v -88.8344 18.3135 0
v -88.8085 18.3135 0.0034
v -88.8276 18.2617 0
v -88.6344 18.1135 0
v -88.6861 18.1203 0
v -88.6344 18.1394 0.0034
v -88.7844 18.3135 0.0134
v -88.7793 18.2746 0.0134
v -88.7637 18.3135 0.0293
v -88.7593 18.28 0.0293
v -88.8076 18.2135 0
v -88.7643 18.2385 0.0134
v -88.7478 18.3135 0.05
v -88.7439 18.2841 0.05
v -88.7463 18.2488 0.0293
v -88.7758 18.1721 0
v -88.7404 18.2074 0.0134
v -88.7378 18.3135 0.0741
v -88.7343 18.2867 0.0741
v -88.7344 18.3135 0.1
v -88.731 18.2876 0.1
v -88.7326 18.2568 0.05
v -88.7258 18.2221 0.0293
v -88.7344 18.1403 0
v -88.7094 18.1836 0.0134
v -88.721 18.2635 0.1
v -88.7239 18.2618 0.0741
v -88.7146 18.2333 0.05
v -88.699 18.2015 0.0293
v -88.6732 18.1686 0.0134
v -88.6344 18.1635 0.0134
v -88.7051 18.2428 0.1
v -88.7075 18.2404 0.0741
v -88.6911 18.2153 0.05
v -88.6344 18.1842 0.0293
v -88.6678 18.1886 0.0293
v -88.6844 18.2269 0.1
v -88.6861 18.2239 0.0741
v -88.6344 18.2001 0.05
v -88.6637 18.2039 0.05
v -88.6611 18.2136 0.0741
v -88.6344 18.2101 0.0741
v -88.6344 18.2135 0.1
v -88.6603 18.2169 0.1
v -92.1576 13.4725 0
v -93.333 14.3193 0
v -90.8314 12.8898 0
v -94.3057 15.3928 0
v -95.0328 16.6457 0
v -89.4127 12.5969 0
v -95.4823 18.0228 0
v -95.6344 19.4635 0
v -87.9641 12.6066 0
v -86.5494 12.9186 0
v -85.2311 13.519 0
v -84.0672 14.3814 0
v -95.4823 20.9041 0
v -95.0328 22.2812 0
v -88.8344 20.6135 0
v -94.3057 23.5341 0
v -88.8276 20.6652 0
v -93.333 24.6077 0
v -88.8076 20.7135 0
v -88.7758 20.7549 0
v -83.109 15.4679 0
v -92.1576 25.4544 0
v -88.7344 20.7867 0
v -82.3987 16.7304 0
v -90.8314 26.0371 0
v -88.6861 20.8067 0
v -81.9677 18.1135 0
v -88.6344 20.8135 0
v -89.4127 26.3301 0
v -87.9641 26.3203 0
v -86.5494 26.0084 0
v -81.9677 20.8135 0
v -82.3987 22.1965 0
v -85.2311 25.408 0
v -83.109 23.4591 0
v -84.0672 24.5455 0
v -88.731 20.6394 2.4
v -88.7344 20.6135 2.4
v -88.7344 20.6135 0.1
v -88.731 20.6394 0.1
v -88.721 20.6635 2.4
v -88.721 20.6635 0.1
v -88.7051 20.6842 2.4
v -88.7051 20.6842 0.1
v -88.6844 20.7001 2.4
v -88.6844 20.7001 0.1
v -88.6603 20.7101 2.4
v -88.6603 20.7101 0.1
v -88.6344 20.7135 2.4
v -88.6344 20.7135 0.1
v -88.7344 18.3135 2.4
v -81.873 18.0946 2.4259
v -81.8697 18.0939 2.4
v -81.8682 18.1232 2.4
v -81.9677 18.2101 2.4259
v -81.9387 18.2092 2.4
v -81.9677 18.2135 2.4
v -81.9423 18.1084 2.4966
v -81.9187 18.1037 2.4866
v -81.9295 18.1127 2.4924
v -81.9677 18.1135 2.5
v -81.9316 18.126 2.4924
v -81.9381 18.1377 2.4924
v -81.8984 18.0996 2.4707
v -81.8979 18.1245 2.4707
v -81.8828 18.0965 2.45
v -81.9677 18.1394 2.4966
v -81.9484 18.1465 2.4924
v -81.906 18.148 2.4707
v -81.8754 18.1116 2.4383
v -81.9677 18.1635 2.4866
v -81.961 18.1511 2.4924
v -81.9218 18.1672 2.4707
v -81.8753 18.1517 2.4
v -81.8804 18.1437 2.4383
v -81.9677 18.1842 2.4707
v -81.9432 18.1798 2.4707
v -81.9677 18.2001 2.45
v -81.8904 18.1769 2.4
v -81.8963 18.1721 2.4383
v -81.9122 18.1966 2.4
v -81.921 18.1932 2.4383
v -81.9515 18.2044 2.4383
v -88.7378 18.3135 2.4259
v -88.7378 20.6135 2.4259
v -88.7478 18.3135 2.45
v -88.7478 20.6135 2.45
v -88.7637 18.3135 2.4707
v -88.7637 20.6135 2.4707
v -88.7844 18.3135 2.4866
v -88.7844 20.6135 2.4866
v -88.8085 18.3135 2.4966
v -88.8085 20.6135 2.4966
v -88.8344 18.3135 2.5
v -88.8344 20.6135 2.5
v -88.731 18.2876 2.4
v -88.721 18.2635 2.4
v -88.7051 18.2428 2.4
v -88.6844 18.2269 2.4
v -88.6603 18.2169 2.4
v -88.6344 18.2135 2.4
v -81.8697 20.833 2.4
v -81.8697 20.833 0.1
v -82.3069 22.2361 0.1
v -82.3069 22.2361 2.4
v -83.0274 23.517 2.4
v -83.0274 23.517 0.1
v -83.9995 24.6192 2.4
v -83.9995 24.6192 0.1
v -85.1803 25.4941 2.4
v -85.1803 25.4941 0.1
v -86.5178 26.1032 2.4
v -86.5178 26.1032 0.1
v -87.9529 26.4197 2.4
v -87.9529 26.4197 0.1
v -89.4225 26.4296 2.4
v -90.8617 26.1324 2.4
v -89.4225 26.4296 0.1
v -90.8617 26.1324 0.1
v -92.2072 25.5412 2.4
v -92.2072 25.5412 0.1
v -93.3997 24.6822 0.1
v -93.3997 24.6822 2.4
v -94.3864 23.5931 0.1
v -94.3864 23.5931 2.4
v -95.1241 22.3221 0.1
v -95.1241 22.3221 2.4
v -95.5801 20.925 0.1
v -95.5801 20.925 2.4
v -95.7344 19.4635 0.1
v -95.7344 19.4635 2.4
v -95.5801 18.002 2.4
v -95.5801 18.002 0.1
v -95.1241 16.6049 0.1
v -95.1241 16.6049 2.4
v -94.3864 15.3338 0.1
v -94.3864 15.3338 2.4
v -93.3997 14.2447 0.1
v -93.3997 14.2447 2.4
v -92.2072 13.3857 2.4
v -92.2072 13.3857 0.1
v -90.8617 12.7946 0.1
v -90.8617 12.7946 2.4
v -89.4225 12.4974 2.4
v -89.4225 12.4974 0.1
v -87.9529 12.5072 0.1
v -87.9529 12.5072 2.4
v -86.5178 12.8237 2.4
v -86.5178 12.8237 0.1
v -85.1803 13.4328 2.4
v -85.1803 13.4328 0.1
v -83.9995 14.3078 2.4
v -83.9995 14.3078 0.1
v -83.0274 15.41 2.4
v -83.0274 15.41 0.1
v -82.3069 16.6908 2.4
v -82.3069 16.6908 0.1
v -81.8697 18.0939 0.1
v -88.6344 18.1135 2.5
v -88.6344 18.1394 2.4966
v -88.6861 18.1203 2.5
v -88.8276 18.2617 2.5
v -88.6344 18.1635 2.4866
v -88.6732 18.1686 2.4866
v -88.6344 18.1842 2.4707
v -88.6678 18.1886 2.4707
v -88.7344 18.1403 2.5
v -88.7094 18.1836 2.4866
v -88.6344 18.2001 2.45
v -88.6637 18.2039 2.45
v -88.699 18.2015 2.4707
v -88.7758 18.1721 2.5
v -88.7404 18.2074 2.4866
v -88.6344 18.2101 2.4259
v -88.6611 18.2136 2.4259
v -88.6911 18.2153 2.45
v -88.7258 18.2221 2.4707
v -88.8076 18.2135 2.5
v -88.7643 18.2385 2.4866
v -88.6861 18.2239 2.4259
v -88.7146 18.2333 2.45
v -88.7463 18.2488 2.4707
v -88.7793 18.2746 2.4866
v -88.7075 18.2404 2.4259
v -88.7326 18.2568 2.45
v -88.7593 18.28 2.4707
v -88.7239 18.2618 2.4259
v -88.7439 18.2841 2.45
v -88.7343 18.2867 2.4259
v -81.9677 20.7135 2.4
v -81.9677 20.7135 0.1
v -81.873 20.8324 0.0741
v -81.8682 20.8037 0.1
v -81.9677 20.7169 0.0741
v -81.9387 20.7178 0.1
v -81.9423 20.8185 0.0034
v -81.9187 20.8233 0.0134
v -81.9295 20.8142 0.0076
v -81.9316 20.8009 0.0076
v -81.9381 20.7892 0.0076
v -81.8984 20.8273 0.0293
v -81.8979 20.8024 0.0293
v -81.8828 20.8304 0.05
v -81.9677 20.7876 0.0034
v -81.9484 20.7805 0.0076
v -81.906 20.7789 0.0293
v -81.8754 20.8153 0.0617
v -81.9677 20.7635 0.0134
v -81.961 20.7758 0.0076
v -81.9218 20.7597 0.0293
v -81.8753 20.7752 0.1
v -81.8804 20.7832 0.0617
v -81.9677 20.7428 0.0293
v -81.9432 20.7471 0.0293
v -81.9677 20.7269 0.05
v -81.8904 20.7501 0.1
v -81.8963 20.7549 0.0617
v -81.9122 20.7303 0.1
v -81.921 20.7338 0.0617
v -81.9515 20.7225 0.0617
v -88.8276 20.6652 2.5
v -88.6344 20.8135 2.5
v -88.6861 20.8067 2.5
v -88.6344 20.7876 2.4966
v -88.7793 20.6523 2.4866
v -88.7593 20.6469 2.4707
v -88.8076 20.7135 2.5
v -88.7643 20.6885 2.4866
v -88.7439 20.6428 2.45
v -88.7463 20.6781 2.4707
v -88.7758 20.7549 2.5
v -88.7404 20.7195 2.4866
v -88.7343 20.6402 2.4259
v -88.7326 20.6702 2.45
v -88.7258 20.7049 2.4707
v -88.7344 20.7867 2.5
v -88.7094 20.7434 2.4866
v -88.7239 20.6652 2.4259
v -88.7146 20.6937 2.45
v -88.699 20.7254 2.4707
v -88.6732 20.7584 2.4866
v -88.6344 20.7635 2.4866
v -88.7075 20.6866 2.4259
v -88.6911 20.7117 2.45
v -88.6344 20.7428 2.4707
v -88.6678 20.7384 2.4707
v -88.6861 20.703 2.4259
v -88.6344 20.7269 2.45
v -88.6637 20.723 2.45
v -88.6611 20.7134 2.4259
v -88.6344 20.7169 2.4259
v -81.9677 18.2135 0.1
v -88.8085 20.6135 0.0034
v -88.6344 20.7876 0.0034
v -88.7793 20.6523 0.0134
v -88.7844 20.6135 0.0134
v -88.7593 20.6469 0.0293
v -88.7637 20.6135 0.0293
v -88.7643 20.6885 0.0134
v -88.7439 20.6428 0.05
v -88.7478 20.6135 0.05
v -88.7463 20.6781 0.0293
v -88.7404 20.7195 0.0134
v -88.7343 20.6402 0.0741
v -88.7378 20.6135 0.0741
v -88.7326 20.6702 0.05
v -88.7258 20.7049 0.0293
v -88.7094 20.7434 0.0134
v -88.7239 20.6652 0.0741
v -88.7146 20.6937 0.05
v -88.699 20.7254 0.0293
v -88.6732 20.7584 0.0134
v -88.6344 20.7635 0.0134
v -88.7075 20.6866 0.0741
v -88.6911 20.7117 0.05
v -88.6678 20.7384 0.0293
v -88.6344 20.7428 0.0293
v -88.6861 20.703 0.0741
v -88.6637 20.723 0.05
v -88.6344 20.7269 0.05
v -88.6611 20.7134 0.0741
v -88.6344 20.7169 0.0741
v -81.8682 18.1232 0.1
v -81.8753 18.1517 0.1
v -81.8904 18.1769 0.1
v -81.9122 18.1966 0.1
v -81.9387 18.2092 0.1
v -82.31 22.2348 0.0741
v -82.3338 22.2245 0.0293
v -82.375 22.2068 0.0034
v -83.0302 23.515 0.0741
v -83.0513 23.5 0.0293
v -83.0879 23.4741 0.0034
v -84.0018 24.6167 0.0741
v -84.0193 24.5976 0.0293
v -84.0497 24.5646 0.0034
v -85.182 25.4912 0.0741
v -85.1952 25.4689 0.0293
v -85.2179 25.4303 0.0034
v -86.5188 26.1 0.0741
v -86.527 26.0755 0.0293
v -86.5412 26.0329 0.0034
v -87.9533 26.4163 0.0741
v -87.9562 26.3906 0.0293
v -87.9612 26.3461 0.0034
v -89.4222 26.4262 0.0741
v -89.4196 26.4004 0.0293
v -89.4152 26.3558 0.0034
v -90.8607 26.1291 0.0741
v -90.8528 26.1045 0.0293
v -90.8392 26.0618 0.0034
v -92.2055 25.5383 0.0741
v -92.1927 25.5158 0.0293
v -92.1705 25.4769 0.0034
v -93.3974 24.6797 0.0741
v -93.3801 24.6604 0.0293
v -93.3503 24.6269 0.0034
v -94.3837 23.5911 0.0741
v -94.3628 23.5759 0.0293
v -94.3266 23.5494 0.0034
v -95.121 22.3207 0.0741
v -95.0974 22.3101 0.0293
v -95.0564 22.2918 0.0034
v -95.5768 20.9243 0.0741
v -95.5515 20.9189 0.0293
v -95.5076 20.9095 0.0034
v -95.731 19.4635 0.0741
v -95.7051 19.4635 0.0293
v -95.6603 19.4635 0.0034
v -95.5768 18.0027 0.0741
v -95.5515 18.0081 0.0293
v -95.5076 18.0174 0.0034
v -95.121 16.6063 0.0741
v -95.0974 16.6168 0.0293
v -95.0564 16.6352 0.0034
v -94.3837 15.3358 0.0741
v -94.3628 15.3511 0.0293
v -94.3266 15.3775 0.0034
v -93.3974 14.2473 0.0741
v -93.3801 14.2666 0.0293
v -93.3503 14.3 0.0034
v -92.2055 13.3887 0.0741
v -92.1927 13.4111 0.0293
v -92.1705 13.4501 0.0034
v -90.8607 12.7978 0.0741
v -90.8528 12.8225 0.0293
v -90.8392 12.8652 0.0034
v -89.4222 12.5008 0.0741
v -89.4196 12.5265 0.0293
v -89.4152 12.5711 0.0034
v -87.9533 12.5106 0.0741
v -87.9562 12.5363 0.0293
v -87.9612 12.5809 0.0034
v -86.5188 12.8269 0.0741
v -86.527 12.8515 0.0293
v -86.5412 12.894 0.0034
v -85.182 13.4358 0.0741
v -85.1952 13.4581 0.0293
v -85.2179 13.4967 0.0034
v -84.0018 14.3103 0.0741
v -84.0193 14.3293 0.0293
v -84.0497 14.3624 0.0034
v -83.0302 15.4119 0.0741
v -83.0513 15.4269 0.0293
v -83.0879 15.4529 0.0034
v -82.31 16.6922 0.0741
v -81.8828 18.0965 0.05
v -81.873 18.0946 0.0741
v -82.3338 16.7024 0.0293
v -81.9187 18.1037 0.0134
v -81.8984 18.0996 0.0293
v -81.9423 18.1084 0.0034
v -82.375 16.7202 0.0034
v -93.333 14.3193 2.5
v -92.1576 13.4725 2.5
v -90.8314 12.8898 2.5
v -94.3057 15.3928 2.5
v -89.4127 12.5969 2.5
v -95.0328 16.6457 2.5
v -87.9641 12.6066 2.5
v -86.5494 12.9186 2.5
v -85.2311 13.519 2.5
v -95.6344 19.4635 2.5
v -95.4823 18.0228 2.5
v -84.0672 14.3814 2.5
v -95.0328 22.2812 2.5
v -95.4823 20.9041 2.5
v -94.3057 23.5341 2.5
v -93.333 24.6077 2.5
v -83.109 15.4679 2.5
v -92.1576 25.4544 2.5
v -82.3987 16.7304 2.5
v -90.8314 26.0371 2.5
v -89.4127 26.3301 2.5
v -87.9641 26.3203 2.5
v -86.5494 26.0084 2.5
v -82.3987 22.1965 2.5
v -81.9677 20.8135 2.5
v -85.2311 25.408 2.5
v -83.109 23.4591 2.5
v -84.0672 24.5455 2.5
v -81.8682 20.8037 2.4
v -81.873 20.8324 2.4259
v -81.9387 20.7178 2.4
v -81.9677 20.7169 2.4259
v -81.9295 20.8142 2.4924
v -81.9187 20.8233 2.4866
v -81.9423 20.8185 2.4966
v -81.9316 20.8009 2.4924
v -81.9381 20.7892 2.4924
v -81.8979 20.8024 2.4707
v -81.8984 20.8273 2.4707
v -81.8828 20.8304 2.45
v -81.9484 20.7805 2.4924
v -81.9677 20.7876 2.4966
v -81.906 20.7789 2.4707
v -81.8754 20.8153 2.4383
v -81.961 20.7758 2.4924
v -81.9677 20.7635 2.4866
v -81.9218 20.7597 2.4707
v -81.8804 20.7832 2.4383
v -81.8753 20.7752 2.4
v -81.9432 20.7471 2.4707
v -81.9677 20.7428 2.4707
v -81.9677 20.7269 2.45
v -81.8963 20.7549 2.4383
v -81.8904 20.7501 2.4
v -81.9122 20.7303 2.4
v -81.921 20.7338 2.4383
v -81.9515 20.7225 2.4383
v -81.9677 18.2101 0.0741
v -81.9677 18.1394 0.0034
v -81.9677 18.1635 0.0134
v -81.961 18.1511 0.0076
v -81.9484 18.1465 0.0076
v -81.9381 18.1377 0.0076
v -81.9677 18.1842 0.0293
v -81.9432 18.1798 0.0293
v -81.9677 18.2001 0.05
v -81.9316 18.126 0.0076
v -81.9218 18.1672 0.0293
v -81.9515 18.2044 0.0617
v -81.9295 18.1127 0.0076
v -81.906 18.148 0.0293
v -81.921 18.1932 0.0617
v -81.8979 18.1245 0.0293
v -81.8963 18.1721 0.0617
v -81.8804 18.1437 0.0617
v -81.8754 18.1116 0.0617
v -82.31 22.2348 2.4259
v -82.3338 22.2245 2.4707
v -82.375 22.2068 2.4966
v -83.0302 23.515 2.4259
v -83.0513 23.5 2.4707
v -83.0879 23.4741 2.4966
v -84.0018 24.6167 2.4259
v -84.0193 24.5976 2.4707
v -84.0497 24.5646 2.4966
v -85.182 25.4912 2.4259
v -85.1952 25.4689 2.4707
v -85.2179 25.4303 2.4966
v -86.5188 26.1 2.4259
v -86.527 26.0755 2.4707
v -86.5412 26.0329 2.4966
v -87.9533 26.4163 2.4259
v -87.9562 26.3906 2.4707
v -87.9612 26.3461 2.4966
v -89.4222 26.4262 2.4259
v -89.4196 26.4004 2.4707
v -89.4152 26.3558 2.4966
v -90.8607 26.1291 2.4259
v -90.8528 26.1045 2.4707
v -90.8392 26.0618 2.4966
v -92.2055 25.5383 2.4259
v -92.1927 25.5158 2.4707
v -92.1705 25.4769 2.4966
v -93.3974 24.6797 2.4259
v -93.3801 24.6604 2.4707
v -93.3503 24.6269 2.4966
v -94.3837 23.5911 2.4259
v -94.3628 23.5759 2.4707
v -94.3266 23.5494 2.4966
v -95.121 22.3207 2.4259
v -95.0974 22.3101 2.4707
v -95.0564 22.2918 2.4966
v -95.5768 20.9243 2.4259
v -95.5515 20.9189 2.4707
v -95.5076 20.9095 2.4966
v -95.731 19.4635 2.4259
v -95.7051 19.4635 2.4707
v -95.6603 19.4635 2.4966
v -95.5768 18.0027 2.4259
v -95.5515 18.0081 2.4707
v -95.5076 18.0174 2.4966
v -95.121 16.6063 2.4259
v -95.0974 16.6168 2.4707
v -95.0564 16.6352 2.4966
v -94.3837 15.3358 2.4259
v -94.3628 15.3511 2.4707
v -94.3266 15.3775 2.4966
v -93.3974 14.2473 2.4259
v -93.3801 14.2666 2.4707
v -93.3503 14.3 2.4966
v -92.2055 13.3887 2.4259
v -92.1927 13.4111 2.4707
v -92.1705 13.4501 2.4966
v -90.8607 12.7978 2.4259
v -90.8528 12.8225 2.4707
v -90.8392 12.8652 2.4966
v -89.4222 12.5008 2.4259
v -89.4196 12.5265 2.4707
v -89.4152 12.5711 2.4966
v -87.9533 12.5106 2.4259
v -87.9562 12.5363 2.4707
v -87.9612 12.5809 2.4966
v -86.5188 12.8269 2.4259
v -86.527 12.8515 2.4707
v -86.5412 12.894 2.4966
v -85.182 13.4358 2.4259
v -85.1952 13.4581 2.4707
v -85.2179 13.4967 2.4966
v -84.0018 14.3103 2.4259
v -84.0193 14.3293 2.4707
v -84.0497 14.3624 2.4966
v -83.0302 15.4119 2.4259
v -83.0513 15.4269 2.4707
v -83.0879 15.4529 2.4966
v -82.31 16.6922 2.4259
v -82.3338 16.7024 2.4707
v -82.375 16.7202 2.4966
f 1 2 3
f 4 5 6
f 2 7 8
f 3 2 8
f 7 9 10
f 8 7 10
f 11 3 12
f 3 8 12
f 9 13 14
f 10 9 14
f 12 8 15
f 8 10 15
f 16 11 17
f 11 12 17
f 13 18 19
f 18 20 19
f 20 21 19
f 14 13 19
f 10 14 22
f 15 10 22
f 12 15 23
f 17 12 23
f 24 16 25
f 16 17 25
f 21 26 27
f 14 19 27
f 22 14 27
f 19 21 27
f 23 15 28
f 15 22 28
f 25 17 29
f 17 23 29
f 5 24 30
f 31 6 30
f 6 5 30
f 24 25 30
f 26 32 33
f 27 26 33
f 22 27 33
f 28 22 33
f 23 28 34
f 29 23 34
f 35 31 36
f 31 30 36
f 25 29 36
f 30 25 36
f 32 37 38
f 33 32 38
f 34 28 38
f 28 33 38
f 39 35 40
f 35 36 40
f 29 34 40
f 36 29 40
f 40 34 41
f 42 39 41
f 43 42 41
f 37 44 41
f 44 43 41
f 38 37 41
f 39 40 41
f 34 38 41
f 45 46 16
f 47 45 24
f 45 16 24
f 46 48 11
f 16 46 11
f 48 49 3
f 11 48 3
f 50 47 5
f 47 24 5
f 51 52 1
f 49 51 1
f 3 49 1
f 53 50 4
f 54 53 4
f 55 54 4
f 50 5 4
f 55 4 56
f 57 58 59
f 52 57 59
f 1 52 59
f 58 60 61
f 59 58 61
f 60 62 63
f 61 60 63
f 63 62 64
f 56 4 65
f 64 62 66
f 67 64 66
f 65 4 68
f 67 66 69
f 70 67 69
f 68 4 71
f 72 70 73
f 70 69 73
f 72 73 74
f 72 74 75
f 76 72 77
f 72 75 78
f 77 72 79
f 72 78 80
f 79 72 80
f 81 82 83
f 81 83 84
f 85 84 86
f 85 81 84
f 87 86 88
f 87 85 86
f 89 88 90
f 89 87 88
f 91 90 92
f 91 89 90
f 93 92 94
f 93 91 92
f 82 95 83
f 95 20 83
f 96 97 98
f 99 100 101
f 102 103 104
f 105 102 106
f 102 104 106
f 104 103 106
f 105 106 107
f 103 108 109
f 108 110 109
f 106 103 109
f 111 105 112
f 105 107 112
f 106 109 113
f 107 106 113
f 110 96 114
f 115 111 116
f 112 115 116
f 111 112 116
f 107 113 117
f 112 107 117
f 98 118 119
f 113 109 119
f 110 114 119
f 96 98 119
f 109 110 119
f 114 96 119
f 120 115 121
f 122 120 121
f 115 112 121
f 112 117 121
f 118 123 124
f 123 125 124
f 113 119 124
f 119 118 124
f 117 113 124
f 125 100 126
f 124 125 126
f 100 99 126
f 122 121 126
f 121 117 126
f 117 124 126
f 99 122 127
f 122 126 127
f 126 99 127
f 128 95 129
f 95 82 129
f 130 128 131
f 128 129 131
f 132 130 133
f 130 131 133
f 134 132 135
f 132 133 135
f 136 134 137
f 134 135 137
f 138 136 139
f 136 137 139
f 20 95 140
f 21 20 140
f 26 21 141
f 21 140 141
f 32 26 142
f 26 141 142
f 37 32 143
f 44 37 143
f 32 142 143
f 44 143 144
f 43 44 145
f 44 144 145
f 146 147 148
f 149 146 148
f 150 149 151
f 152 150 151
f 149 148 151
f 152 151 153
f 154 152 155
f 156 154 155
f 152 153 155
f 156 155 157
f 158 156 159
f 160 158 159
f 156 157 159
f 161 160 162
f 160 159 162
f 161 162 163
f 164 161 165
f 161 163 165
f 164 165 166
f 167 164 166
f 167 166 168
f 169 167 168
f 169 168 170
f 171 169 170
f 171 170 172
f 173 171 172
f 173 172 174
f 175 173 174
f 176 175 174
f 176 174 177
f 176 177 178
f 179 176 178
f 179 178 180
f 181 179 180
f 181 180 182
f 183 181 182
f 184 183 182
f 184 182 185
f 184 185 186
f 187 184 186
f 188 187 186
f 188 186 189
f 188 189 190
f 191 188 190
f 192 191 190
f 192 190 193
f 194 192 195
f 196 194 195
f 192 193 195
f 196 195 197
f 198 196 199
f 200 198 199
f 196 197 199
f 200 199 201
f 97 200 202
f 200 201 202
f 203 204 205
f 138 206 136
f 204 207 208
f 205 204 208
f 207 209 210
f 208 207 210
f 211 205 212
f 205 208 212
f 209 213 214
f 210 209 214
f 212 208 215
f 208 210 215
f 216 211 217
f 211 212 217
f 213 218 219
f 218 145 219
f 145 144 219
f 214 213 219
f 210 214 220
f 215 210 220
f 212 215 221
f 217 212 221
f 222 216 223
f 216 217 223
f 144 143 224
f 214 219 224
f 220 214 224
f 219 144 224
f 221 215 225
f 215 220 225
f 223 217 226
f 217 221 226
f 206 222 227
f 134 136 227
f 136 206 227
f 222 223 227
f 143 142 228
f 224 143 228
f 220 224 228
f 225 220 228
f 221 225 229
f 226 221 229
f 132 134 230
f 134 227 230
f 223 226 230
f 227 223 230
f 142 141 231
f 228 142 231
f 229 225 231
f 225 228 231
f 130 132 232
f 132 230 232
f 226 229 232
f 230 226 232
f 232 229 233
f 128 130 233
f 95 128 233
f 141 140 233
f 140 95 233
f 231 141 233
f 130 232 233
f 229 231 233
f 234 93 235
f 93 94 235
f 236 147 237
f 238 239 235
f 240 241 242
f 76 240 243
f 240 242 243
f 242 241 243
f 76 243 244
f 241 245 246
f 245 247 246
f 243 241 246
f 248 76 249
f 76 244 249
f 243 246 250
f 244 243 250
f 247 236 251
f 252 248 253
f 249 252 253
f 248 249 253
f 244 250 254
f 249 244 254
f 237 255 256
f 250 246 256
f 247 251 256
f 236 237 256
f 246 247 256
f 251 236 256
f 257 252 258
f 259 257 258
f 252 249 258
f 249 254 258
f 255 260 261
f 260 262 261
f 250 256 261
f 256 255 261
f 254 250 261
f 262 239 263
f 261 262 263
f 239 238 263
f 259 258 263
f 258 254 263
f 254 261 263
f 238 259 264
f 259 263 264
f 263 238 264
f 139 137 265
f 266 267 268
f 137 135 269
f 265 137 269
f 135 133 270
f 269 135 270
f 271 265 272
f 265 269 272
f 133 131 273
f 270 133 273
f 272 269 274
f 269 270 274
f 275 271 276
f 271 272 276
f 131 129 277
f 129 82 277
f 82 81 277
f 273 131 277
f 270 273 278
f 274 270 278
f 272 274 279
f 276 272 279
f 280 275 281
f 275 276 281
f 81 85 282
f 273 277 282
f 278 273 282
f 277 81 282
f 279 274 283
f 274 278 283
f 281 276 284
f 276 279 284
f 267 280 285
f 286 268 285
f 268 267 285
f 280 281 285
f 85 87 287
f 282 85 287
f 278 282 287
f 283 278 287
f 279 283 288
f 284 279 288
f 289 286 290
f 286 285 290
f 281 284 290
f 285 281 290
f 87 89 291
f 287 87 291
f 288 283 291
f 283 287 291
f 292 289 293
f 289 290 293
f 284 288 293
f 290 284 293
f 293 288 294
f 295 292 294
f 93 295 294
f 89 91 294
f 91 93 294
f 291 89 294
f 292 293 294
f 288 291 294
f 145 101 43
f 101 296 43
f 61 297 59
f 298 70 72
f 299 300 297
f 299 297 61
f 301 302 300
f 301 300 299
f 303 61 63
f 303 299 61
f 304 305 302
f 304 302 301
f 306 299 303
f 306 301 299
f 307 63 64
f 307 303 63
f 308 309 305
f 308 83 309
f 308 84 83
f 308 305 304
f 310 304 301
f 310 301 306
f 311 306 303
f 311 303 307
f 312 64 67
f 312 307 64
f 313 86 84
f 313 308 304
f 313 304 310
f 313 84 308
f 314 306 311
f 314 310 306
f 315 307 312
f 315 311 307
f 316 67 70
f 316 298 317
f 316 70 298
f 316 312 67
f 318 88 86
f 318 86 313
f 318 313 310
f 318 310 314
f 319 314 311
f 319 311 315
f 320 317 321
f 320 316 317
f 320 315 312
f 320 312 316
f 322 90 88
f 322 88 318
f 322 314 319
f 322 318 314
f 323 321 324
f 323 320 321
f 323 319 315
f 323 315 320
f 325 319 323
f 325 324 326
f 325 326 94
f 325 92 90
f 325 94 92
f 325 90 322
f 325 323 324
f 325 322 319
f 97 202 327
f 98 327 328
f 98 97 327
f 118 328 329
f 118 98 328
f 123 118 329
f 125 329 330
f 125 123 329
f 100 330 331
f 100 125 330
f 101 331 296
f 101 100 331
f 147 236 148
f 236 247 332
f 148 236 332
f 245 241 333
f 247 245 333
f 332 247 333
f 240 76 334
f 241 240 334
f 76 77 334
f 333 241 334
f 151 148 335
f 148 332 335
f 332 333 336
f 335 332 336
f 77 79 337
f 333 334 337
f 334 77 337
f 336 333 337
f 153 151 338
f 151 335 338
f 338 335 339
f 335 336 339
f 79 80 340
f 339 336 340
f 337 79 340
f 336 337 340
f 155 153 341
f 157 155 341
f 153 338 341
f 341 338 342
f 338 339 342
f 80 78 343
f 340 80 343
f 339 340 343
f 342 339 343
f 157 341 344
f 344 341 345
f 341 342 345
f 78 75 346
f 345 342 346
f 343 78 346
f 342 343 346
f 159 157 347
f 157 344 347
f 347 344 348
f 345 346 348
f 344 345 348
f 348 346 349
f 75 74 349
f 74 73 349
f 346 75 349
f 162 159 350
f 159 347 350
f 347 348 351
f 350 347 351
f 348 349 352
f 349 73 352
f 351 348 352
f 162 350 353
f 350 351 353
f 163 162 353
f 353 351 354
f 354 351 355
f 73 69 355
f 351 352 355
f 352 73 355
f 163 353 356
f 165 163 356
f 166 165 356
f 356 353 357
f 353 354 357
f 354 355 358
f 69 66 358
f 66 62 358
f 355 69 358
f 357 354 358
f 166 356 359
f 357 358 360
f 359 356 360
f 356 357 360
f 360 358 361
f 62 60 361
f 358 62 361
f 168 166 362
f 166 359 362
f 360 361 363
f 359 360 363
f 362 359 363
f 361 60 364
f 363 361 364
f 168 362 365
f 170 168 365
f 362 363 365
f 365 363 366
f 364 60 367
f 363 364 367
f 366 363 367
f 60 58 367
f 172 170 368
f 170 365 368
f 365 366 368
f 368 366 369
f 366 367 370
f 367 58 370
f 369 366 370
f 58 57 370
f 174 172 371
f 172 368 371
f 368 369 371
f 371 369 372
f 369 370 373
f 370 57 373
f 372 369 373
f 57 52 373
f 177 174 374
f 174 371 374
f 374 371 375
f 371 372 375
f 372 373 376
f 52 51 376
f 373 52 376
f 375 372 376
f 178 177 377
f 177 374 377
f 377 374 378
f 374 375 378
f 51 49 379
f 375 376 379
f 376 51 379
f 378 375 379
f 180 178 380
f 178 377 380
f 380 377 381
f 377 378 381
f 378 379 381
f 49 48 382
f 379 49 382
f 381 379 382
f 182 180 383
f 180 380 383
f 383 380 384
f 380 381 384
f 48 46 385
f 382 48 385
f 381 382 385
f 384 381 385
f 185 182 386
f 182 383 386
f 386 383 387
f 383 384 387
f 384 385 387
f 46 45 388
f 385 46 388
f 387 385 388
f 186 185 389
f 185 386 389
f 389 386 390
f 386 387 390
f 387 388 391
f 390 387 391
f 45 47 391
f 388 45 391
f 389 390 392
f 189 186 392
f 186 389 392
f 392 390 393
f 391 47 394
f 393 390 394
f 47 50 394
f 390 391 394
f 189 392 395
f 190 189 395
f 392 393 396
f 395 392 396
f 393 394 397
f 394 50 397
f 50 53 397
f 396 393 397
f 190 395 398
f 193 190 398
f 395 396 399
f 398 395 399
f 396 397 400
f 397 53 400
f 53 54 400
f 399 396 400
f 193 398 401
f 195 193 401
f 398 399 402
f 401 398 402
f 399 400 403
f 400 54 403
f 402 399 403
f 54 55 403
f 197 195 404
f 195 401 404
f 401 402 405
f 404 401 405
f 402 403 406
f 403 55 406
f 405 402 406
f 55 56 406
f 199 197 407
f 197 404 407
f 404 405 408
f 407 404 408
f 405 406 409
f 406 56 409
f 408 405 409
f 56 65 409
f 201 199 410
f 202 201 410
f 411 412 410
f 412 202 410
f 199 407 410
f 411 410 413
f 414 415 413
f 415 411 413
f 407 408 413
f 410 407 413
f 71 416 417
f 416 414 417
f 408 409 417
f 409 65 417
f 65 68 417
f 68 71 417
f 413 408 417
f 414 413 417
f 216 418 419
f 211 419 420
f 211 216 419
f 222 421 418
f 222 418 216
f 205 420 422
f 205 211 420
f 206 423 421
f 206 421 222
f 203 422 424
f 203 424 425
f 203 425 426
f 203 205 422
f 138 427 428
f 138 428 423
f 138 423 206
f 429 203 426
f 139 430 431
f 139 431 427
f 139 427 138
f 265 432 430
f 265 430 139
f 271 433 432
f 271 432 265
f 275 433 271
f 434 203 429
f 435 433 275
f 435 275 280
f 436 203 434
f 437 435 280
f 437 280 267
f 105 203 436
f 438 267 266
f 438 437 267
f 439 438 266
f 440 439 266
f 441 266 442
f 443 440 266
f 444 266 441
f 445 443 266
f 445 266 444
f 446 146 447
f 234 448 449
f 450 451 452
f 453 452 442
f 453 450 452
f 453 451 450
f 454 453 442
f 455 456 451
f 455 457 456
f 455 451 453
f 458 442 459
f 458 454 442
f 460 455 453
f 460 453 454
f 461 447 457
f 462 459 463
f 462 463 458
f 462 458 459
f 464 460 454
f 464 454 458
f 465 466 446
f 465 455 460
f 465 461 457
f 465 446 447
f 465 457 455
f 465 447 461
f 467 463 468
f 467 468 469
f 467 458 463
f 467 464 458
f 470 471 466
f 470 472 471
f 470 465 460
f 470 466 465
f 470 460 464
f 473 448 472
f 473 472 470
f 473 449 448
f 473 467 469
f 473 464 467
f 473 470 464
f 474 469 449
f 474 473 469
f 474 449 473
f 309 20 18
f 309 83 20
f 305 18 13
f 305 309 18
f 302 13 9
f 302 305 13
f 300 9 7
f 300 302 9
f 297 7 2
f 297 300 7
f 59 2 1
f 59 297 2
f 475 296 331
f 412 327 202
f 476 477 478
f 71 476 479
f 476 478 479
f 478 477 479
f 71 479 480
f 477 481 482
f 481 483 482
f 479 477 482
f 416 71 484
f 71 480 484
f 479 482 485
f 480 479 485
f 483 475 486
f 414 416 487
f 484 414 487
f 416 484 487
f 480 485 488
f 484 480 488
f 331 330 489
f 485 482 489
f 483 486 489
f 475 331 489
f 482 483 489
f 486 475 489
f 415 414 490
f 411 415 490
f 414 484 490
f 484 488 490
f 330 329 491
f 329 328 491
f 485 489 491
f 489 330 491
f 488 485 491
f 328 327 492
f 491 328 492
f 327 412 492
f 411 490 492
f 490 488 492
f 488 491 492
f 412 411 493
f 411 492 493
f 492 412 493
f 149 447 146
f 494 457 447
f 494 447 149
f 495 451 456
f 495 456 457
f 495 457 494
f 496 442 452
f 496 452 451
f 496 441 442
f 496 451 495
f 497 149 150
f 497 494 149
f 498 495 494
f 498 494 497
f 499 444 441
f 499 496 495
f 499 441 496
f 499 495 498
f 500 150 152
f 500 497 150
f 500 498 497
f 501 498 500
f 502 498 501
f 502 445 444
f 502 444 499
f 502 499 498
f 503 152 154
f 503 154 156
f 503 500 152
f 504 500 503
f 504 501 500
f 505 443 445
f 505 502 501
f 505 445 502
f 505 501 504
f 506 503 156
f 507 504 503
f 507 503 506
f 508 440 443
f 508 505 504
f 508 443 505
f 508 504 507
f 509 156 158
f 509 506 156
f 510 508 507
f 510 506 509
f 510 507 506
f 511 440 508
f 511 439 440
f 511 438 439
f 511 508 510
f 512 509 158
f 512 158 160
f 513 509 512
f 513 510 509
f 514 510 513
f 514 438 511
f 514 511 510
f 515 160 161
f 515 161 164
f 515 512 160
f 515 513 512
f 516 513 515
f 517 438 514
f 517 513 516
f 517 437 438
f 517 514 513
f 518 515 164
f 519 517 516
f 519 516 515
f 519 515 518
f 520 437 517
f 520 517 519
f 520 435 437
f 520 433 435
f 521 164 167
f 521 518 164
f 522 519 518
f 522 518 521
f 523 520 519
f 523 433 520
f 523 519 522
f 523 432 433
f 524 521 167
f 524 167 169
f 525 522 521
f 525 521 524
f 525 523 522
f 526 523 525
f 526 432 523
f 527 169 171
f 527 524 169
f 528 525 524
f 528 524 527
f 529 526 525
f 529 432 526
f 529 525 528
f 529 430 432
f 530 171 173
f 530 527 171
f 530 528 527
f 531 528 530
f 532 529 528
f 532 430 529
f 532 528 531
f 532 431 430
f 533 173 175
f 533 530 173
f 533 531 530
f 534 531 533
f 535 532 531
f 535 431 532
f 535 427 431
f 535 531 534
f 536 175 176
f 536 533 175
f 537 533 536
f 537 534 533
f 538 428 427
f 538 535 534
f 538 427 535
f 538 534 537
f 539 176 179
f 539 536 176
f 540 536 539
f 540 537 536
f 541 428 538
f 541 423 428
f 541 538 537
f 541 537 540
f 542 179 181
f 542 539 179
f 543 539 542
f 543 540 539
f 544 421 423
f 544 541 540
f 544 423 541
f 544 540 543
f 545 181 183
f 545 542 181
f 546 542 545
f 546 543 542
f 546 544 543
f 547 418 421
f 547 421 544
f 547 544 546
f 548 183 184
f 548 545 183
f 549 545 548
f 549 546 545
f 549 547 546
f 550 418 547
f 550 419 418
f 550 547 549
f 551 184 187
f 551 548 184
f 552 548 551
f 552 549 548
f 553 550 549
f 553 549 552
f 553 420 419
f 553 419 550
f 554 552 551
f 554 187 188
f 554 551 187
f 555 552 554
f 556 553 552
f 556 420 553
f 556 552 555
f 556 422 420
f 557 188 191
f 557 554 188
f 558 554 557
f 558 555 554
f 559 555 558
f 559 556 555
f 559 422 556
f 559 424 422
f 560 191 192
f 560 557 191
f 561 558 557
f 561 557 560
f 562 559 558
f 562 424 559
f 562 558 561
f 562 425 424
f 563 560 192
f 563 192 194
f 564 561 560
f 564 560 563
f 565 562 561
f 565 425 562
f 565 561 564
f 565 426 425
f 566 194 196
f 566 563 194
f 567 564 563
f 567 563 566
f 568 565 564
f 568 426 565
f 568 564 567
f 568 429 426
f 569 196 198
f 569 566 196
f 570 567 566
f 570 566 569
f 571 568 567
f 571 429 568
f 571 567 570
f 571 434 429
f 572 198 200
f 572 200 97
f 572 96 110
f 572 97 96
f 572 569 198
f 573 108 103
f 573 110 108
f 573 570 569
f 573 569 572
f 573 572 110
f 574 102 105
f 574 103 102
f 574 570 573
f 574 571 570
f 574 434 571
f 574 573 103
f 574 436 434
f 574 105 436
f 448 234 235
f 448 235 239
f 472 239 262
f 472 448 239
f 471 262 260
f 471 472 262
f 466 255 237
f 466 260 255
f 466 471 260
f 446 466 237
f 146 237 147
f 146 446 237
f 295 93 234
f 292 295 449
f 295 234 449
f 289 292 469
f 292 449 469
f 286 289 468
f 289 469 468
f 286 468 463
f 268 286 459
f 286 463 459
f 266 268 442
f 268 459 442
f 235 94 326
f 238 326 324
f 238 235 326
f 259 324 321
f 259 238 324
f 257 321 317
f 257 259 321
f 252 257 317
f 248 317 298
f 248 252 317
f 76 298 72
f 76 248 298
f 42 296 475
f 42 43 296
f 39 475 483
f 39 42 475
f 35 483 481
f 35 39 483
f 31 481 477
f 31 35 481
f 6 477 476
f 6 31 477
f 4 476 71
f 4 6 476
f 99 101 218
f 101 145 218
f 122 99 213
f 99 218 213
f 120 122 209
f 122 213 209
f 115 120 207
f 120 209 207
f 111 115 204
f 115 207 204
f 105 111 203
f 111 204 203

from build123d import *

# Parameters (mm, degrees)
RESSALTO_EXTRUS_O1_DEPTH = 2.5
FILETE1_R                = 0.1


with BuildPart() as part:
    # Esboço1 → Ressalto-extrusão1 (new body)
    with BuildSketch(Plane.XY):
        with BuildLine():
            Line((-88.734374253, 18.21347197), (-88.734374253, 20.71347197))
            Line((-88.734374253, 20.71347197), (-81.846885596, 20.71347197))
            ThreePointArc((-81.846885596, 20.71347197), (-95.734374253, 19.46347197), (-81.846885596, 18.21347197))
            Line((-81.846885596, 18.21347197), (-88.734374253, 18.21347197))
        make_face()
    extrude(amount=RESSALTO_EXTRUS_O1_DEPTH)

    # Filete1
    filete1_edges = [part.edges().sort_by_distance(p)[0] for p in [
        (-85.290629924, 18.21347197, 2.5),
        (-88.734374253, 19.46347197, 2.5),
        (-85.290629924, 20.71347197, 2.5),
        (-88.734374253, 19.46347197, 0),
        (-85.290629924, 18.21347197, 0),
        (-95.734374253, 19.46347197, 0),
        (-85.290629924, 20.71347197, 0),
        (-88.734374253, 20.71347197, 1.25),
        (-88.734374253, 18.21347197, 1.25),
        (-81.846885596, 18.21347197, 1.25),
        (-81.846885596, 20.71347197, 1.25),
        (-95.734374253, 19.46347197, 2.5),
    ]]
    fillet(filete1_edges, radius=FILETE1_R)


solid = part.part
